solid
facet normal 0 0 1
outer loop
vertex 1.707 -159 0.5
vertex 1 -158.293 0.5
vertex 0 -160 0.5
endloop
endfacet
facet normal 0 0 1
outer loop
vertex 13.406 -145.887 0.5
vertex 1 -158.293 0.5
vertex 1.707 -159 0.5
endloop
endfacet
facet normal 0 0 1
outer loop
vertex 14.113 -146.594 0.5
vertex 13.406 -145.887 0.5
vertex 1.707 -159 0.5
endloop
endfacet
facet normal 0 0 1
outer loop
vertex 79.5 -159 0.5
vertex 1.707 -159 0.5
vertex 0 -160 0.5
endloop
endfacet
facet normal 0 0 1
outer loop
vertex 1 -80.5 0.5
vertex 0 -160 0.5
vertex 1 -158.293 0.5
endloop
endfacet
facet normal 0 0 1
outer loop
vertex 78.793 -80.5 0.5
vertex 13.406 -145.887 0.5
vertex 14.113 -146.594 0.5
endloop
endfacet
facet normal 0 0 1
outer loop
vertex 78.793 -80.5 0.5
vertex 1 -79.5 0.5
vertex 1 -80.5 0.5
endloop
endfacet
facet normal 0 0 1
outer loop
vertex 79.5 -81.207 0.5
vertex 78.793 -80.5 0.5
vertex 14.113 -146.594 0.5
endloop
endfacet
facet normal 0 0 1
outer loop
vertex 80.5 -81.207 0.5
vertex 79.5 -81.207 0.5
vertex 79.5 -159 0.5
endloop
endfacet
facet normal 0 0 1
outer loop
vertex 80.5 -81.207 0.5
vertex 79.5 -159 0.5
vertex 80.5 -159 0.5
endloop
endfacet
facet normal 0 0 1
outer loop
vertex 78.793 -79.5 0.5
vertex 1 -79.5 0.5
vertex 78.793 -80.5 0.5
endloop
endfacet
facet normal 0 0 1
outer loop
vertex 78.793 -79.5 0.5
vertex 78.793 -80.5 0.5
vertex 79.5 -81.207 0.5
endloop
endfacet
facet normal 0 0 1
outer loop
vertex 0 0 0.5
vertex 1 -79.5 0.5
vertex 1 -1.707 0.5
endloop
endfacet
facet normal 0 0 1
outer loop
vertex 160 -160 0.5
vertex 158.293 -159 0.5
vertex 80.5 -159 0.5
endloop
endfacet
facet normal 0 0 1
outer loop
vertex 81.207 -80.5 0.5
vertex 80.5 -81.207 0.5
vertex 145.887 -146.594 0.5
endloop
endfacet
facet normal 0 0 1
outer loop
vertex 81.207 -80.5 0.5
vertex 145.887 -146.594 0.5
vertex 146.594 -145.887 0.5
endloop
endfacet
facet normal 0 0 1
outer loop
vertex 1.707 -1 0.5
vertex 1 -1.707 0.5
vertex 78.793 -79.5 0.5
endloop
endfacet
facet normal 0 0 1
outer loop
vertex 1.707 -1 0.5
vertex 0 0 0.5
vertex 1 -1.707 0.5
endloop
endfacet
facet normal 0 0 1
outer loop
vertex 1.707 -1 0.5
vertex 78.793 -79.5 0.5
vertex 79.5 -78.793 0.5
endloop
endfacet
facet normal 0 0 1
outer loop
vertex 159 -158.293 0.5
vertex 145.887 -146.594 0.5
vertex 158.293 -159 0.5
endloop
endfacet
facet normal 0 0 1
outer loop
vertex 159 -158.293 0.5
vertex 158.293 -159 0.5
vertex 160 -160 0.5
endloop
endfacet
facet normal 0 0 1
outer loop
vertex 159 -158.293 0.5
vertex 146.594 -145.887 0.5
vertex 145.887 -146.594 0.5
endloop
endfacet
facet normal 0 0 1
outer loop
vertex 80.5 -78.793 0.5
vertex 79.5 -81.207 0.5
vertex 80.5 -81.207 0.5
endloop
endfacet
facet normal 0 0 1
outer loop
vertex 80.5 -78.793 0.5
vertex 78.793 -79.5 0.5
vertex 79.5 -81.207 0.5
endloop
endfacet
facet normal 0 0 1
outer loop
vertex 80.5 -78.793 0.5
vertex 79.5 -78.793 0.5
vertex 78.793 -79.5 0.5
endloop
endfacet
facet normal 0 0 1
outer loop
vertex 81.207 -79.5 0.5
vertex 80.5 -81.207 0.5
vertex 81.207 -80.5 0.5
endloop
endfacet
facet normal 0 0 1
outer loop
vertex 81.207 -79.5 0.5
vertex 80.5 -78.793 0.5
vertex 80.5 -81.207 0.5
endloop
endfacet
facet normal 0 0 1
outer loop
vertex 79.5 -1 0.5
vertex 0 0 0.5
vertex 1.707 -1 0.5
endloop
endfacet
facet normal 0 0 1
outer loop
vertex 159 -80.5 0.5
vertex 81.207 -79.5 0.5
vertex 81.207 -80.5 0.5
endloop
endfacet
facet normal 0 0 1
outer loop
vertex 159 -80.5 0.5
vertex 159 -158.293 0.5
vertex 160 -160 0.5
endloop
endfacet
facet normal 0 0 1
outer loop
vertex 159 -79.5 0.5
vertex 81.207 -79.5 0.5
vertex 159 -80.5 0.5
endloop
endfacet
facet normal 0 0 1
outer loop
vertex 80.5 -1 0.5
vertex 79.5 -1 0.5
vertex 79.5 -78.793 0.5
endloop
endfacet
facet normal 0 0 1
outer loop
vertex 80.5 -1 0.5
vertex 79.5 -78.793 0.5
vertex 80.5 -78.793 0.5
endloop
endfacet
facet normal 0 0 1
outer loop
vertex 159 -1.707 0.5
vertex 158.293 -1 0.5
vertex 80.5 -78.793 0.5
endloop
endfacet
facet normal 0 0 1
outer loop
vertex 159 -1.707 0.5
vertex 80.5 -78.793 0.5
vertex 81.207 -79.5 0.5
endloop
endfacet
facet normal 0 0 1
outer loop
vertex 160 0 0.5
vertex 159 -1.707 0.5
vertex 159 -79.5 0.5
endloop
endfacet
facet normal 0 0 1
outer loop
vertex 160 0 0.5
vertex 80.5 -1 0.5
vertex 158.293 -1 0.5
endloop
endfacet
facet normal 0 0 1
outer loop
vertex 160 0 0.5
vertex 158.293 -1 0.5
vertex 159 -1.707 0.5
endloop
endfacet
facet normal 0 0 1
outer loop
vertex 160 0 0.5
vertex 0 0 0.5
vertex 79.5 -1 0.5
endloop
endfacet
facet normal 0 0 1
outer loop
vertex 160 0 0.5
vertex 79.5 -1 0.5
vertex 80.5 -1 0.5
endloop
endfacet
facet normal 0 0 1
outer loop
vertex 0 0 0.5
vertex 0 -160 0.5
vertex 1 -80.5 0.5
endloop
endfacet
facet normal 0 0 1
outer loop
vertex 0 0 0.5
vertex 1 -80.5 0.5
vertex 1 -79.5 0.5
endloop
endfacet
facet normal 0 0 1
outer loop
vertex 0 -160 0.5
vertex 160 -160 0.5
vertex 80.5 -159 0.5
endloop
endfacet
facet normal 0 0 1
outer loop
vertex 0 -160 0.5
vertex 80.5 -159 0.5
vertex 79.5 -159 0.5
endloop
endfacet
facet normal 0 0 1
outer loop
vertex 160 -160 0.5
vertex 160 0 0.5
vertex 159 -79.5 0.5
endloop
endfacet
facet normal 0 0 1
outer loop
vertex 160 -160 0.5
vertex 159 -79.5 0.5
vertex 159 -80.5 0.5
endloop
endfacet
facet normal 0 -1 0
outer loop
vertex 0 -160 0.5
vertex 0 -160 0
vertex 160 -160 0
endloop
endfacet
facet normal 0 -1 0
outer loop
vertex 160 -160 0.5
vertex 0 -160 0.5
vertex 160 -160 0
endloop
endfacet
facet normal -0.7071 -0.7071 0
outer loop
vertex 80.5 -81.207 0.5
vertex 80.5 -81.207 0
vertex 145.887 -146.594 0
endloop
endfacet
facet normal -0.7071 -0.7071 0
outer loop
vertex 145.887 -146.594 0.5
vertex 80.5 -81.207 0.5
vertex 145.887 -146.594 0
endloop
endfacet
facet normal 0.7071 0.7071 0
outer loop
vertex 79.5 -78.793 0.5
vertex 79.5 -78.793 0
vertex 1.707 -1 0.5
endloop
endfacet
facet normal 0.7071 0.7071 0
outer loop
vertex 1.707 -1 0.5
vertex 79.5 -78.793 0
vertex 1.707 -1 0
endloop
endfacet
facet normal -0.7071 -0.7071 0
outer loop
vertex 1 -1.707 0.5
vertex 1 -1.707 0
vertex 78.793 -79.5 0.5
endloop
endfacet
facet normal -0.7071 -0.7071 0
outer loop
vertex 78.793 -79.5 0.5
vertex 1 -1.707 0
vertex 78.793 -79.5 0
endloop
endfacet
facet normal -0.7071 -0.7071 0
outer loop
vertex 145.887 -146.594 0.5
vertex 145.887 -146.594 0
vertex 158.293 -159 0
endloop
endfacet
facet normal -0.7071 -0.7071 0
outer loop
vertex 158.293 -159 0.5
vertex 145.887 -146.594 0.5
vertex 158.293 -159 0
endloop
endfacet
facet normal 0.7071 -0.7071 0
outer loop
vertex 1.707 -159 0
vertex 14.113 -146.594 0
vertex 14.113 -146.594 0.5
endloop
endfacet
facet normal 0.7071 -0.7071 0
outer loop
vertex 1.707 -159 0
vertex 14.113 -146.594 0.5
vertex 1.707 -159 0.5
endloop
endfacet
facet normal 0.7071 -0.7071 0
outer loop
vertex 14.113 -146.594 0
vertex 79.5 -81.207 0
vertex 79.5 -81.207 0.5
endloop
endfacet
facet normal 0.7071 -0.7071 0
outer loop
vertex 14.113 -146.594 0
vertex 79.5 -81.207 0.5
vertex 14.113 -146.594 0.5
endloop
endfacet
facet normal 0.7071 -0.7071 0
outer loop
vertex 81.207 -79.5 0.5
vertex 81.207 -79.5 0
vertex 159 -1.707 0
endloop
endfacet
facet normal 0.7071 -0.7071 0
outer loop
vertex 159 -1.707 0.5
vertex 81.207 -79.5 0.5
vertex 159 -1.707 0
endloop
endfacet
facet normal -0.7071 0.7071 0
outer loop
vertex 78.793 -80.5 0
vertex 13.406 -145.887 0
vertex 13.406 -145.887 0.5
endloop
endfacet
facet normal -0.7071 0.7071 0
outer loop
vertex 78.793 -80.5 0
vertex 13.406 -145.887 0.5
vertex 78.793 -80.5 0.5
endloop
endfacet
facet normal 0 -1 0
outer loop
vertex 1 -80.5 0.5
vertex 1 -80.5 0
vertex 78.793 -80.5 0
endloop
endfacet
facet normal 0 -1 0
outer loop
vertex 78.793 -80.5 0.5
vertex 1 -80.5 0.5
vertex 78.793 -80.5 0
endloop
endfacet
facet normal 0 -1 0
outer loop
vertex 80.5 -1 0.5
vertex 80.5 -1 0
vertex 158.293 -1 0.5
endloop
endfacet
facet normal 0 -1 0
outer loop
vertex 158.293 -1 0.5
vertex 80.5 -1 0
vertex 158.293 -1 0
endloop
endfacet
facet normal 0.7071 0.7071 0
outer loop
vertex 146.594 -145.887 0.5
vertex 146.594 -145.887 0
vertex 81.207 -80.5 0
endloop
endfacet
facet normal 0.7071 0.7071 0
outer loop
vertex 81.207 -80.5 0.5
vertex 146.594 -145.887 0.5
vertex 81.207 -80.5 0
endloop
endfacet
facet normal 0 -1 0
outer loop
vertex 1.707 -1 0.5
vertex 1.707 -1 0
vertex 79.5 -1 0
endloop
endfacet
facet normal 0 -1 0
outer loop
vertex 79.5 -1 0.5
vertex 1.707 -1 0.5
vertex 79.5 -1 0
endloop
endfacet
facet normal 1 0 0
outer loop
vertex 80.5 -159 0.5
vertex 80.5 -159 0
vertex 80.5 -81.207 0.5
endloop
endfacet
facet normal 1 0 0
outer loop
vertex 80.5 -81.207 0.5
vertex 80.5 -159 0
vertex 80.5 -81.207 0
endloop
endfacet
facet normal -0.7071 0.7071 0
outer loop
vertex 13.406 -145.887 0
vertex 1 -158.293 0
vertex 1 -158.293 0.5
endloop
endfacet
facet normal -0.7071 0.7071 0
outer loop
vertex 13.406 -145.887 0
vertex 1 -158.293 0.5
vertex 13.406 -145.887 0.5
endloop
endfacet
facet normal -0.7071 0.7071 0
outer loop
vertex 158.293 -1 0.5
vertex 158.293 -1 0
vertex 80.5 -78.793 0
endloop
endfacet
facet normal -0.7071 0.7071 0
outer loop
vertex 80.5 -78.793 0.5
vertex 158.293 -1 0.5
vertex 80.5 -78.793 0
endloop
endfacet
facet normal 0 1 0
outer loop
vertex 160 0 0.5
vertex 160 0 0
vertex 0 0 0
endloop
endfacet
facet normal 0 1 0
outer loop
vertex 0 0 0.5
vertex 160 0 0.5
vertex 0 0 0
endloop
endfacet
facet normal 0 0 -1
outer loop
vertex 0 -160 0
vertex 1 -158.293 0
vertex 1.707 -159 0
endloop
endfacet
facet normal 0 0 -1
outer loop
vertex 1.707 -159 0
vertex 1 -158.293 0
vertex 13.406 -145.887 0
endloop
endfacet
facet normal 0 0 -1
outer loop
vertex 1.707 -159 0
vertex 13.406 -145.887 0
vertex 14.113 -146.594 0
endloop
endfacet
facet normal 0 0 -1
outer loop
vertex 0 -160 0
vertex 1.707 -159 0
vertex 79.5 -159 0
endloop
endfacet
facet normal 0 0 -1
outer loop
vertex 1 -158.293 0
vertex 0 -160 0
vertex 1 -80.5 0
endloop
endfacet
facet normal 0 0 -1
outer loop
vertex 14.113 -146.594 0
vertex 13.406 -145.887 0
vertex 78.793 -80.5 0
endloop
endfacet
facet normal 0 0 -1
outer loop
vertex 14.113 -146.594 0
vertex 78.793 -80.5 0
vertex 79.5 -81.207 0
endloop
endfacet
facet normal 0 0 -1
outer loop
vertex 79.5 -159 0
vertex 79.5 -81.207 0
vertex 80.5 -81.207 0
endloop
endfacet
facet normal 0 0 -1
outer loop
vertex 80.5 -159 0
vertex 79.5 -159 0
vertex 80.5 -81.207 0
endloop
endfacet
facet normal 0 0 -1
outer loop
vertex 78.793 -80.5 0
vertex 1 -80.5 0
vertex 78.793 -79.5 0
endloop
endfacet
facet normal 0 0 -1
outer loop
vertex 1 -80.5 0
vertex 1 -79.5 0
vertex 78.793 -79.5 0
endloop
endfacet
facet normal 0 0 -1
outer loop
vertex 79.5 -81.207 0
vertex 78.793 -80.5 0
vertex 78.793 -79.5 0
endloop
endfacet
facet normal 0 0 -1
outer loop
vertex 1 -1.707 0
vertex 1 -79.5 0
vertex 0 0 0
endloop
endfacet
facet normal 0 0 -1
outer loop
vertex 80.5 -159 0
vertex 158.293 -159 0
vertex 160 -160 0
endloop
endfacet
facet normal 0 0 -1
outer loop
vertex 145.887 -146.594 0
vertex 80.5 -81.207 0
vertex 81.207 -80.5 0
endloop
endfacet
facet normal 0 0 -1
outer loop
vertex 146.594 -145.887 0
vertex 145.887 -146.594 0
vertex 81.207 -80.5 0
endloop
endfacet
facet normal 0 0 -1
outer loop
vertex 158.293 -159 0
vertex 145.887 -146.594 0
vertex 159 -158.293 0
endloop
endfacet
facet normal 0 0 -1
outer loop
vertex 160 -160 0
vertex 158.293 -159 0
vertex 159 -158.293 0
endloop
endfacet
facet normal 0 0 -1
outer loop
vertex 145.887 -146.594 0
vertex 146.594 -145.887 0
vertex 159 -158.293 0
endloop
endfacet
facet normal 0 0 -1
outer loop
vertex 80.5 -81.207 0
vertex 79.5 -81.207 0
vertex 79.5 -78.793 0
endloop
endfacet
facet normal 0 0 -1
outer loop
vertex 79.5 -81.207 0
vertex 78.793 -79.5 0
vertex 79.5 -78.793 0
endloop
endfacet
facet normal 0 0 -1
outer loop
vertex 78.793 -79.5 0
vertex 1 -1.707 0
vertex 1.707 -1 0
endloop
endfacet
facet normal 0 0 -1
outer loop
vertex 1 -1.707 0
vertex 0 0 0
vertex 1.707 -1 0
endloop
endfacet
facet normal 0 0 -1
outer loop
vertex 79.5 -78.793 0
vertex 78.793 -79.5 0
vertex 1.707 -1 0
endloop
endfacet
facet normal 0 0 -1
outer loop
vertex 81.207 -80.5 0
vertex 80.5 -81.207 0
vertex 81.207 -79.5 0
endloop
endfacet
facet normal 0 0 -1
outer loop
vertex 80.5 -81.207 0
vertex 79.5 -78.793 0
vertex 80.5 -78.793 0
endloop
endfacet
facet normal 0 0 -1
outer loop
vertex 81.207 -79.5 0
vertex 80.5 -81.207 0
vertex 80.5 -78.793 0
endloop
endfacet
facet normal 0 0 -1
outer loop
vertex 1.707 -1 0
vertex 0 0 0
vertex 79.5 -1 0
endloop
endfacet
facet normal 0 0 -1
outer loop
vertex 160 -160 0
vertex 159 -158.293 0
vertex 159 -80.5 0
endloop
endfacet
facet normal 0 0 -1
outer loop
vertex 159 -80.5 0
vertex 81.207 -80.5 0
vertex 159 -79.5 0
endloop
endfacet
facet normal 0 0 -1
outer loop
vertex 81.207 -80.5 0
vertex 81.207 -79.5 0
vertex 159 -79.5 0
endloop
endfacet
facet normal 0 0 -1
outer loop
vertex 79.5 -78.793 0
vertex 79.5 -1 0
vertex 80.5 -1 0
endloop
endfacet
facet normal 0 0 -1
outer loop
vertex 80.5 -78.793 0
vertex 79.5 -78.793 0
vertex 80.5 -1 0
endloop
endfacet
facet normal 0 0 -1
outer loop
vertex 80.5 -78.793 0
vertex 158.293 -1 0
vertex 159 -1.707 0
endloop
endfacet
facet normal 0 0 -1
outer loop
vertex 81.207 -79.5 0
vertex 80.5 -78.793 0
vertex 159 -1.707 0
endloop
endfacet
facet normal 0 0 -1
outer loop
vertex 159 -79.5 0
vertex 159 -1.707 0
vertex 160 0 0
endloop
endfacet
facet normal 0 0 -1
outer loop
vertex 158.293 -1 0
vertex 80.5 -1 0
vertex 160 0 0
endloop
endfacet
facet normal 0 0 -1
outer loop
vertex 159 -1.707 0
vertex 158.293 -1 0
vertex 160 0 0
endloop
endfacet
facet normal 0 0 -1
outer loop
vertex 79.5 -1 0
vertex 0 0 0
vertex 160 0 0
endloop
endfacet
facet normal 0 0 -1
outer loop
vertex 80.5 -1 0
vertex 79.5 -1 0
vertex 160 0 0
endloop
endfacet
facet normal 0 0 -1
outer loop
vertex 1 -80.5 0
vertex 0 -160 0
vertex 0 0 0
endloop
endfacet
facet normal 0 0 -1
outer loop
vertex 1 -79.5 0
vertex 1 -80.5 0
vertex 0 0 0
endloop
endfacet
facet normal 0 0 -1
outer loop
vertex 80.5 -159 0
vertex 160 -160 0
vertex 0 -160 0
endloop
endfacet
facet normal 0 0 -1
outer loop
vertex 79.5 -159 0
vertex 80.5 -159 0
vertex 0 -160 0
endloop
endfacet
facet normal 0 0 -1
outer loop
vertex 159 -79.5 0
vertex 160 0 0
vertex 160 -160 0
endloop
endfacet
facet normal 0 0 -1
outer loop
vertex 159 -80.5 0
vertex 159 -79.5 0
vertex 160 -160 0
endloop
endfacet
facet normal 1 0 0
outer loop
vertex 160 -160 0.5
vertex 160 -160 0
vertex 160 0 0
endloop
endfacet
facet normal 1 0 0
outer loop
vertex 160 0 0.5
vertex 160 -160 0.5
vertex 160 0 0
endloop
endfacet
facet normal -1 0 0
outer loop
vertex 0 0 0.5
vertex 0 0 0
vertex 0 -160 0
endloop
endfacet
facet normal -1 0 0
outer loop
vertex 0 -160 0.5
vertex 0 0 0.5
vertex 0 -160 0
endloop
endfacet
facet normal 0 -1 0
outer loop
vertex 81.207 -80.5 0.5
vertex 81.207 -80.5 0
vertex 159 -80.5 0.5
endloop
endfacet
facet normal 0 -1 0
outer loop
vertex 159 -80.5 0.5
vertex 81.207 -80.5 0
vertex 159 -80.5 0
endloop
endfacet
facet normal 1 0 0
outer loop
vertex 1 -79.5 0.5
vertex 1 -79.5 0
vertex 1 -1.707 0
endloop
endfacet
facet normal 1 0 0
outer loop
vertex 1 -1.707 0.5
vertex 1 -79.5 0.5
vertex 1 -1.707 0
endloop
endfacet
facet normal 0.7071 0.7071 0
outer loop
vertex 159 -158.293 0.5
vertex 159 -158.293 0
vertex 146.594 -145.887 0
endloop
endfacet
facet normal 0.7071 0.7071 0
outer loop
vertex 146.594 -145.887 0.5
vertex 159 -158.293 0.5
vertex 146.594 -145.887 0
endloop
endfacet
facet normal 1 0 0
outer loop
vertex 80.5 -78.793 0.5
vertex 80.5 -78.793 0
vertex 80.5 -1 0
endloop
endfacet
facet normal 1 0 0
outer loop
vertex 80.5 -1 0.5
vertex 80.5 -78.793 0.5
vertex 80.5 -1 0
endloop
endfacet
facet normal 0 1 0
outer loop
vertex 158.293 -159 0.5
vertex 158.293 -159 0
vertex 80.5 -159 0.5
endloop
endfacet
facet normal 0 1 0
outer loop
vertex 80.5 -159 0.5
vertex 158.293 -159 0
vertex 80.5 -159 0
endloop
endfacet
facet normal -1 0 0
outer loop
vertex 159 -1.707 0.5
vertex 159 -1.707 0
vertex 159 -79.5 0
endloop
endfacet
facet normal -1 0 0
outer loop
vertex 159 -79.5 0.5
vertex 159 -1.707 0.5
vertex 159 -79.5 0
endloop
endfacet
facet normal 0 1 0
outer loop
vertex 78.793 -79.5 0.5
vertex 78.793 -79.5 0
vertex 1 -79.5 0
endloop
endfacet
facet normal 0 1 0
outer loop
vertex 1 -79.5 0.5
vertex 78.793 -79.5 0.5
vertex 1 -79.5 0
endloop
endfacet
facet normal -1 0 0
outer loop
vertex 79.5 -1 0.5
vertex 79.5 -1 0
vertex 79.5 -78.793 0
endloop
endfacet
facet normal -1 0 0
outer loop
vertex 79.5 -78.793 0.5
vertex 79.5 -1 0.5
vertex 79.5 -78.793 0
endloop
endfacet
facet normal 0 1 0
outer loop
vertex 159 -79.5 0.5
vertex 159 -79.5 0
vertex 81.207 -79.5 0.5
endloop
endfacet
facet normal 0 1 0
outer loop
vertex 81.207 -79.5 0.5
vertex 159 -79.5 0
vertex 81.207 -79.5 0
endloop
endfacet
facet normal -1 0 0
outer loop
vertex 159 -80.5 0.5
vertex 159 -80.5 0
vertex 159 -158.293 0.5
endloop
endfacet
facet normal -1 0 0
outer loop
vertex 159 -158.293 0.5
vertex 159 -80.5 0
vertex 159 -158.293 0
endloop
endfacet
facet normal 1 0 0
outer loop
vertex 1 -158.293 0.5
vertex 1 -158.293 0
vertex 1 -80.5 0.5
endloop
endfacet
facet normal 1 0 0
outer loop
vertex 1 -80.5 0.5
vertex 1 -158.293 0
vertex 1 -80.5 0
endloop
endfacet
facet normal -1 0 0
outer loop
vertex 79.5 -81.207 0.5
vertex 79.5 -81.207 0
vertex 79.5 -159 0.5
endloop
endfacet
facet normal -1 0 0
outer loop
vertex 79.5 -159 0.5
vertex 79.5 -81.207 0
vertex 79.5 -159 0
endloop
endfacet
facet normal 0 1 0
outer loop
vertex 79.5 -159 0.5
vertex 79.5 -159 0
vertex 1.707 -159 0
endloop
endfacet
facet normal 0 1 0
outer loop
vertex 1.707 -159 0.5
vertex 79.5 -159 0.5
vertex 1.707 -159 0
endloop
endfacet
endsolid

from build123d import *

# Parameters (mm, degrees)
F1_DEPTH = 0.5


# Not quite as in the source:
# - a pattern or mirror of a feature is missing from the dataset's text; its kind, count and spacing are read off the source's solid


with BuildPart() as f1:
    # F0 (on Top) → F1 (new body)
    with BuildSketch(Plane.XY):
        Polygon((160, 0), (0, 0), (0, -1), (0, -160), (160, -160), align=None)
        Polygon((1, -1.7071067812), (1, -1), (1.7071067812, -1), (79.5, -1), (80, -1), (80.5, -1), (158.2928932188, -1), (159, -1), (159, -1.7071067812), (159, -79.5), (159, -80.5), (159, -158.2928932188), (159, -159), (158.2928932188, -159), (80.5, -159), (80, -159), (79.5, -159), (1.7071067812, -159), (1, -159), (1, -158.2928932188), (1, -80.5), (1, -80), (1, -79.5), align=None, mode=Mode.SUBTRACT)
        Polygon((78.7928932188, -79.5), (1, -79.5), (1, -80), (1, -80.5), (78.7928932188, -80.5), (79.2928932188, -80), align=None)
        Polygon((159, -79.5), (81.2071067812, -79.5), (80.7071067812, -80), (81.2071067812, -80.5), (159, -80.5), align=None)
        Polygon((79.5, -78.7928932188), (1.7071067812, -1), (1.3535533906, -1.3535533906), (79.5, -79.5), align=None)
        Polygon((1.3535533906, -1.3535533906), (1, -1.7071067812), (78.7928932188, -79.5), (79.5, -79.5), align=None)
        Polygon((146.2407427602, -146.2407427602), (80.5, -80.5), (80.5, -81.2071067812), (145.8871893697, -146.5942961508), align=None)
        Polygon((81.2071067812, -80.5), (80.5, -80.5), (146.2407427602, -146.2407427602), (146.5942961508, -145.8871893697), align=None)
        Polygon((80, -1), (79.5, -1), (79.5, -78.7928932188), (80, -79.2928932188), align=None)
        Polygon((80.5, -1), (80, -1), (80, -79.2928932188), (80.5, -78.7928932188), align=None)
        Polygon((80, -80.7071067812), (79.5, -81.2071067812), (79.5, -159), (80, -159), align=None)
        Polygon((80.5, -81.2071067812), (80, -80.7071067812), (80, -159), (80.5, -159), align=None)
        Polygon((146.5942961508, -145.8871893697), (146.2407427602, -146.2407427602), (158.6464466094, -158.6464466094), (159, -158.2928932188), align=None)
        Polygon((158.6464466094, -158.6464466094), (146.2407427602, -146.2407427602), (145.8871893697, -146.5942961508), (158.2928932188, -159), align=None)
        Polygon((159, -1), (158.2928932188, -1), (149.7961722435, -9.4967209753), (150.1497256341, -9.8502743659), align=None)
        Polygon((159, -1.7071067812), (159, -1), (150.1497256341, -9.8502743659), (150.5032790247, -10.2038277565), align=None)
        Polygon((80, -79.2928932188), (79.5, -78.7928932188), (79.5, -79.5), (79.7928932188, -79.5), align=None)
        Polygon((79.5, -79.5), (78.7928932188, -79.5), (79.2928932188, -80), (79.5, -79.7928932188), align=None)
        Polygon((80.5, -78.7928932188), (80, -79.2928932188), (80.2071067812, -79.5), (80.5, -79.5), align=None)
        Polygon((79.5, -80.2071067812), (79.2928932188, -80), (78.7928932188, -80.5), (79.5, -80.5), align=None)
        Polygon((80, -80), (79.6464466094, -79.6464466094), (79.5, -79.7928932188), (79.5, -80.2071067812), (79.6464466094, -80.3535533906), align=None)
        Polygon((80.3535533906, -79.6464466094), (80, -80), (80.3535533906, -80.3535533906), (80.5, -80.2071067812), (80.5, -79.7928932188), align=None)
        Polygon((81.2071067812, -79.5), (80.5, -79.5), (80.5, -79.7928932188), (80.7071067812, -80), align=None)
        Polygon((79.7928932188, -80.5), (79.5, -80.5), (79.5, -81.2071067812), (80, -80.7071067812), align=None)
        Polygon((80.5, -80.5), (80.2071067812, -80.5), (80, -80.7071067812), (80.5, -81.2071067812), align=None)
        Polygon((80.7071067812, -80), (80.5, -80.2071067812), (80.5, -80.5), (81.2071067812, -80.5), align=None)
        Polygon((1.7071067812, -1), (1, -1), (1.3535533906, -1.3535533906), align=None)
        Polygon((1.3535533906, -1.3535533906), (1, -1), (1, -1.7071067812), align=None)
        Polygon((1.3535533906, -158.6464466094), (1, -158.2928932188), (1, -159), align=None)
        Polygon((1.3535533906, -158.6464466094), (1, -159), (1.7071067812, -159), align=None)
        Polygon((159, -158.2928932188), (158.6464466094, -158.6464466094), (159, -159), align=None)
        Polygon((159, -159), (158.6464466094, -158.6464466094), (158.2928932188, -159), align=None)
        Polygon((80, -79.5), (79.7928932188, -79.5), (79.6464466094, -79.6464466094), (80, -80), align=None)
        Polygon((80.2071067812, -79.5), (80, -79.5), (80, -80), (80.3535533906, -79.6464466094), align=None)
        Polygon((80.3535533906, -80.3535533906), (80, -80), (80, -80.5), (80.2071067812, -80.5), align=None)
        Polygon((80, -80.5), (80, -80), (79.6464466094, -80.3535533906), (79.7928932188, -80.5), align=None)
        Polygon((79.5, -79.7928932188), (79.2928932188, -80), (79.5, -80.2071067812), align=None)
        Polygon((80.7071067812, -80), (80.5, -79.7928932188), (80.5, -80.2071067812), align=None)
        Polygon((79.7928932188, -79.5), (79.5, -79.5), (79.6464466094, -79.6464466094), align=None)
        Polygon((79.6464466094, -79.6464466094), (79.5, -79.5), (79.5, -79.7928932188), align=None)
        Polygon((80.2071067812, -79.5), (80, -79.2928932188), (80, -79.5), align=None)
        Polygon((80, -79.5), (80, -79.2928932188), (79.7928932188, -79.5), align=None)
        Polygon((80.5, -79.5), (80.2071067812, -79.5), (80.3535533906, -79.6464466094), align=None)
        Polygon((79.6464466094, -80.3535533906), (79.5, -80.2071067812), (79.5, -80.5), align=None)
        Polygon((80.5, -79.7928932188), (80.5, -79.5), (80.3535533906, -79.6464466094), align=None)
        Polygon((79.6464466094, -80.3535533906), (79.5, -80.5), (79.7928932188, -80.5), align=None)
        Polygon((80, -80.7071067812), (80, -80.5), (79.7928932188, -80.5), align=None)
        Polygon((80.2071067812, -80.5), (80, -80.5), (80, -80.7071067812), align=None)
        Polygon((80.5, -80.5), (80.3535533906, -80.3535533906), (80.2071067812, -80.5), align=None)
        Polygon((80.5, -80.2071067812), (80.3535533906, -80.3535533906), (80.5, -80.5), align=None)
    extrude(amount=F1_DEPTH)

    # F1_copies: F1 across plane


with BuildPart() as f1_1:
    add(f1.part)
    add(f1.part.mirror(Plane(origin=(80, 0, 0), x_dir=(0, 0, 1), z_dir=(1, 0, 0))))


solid = f1_1.part
